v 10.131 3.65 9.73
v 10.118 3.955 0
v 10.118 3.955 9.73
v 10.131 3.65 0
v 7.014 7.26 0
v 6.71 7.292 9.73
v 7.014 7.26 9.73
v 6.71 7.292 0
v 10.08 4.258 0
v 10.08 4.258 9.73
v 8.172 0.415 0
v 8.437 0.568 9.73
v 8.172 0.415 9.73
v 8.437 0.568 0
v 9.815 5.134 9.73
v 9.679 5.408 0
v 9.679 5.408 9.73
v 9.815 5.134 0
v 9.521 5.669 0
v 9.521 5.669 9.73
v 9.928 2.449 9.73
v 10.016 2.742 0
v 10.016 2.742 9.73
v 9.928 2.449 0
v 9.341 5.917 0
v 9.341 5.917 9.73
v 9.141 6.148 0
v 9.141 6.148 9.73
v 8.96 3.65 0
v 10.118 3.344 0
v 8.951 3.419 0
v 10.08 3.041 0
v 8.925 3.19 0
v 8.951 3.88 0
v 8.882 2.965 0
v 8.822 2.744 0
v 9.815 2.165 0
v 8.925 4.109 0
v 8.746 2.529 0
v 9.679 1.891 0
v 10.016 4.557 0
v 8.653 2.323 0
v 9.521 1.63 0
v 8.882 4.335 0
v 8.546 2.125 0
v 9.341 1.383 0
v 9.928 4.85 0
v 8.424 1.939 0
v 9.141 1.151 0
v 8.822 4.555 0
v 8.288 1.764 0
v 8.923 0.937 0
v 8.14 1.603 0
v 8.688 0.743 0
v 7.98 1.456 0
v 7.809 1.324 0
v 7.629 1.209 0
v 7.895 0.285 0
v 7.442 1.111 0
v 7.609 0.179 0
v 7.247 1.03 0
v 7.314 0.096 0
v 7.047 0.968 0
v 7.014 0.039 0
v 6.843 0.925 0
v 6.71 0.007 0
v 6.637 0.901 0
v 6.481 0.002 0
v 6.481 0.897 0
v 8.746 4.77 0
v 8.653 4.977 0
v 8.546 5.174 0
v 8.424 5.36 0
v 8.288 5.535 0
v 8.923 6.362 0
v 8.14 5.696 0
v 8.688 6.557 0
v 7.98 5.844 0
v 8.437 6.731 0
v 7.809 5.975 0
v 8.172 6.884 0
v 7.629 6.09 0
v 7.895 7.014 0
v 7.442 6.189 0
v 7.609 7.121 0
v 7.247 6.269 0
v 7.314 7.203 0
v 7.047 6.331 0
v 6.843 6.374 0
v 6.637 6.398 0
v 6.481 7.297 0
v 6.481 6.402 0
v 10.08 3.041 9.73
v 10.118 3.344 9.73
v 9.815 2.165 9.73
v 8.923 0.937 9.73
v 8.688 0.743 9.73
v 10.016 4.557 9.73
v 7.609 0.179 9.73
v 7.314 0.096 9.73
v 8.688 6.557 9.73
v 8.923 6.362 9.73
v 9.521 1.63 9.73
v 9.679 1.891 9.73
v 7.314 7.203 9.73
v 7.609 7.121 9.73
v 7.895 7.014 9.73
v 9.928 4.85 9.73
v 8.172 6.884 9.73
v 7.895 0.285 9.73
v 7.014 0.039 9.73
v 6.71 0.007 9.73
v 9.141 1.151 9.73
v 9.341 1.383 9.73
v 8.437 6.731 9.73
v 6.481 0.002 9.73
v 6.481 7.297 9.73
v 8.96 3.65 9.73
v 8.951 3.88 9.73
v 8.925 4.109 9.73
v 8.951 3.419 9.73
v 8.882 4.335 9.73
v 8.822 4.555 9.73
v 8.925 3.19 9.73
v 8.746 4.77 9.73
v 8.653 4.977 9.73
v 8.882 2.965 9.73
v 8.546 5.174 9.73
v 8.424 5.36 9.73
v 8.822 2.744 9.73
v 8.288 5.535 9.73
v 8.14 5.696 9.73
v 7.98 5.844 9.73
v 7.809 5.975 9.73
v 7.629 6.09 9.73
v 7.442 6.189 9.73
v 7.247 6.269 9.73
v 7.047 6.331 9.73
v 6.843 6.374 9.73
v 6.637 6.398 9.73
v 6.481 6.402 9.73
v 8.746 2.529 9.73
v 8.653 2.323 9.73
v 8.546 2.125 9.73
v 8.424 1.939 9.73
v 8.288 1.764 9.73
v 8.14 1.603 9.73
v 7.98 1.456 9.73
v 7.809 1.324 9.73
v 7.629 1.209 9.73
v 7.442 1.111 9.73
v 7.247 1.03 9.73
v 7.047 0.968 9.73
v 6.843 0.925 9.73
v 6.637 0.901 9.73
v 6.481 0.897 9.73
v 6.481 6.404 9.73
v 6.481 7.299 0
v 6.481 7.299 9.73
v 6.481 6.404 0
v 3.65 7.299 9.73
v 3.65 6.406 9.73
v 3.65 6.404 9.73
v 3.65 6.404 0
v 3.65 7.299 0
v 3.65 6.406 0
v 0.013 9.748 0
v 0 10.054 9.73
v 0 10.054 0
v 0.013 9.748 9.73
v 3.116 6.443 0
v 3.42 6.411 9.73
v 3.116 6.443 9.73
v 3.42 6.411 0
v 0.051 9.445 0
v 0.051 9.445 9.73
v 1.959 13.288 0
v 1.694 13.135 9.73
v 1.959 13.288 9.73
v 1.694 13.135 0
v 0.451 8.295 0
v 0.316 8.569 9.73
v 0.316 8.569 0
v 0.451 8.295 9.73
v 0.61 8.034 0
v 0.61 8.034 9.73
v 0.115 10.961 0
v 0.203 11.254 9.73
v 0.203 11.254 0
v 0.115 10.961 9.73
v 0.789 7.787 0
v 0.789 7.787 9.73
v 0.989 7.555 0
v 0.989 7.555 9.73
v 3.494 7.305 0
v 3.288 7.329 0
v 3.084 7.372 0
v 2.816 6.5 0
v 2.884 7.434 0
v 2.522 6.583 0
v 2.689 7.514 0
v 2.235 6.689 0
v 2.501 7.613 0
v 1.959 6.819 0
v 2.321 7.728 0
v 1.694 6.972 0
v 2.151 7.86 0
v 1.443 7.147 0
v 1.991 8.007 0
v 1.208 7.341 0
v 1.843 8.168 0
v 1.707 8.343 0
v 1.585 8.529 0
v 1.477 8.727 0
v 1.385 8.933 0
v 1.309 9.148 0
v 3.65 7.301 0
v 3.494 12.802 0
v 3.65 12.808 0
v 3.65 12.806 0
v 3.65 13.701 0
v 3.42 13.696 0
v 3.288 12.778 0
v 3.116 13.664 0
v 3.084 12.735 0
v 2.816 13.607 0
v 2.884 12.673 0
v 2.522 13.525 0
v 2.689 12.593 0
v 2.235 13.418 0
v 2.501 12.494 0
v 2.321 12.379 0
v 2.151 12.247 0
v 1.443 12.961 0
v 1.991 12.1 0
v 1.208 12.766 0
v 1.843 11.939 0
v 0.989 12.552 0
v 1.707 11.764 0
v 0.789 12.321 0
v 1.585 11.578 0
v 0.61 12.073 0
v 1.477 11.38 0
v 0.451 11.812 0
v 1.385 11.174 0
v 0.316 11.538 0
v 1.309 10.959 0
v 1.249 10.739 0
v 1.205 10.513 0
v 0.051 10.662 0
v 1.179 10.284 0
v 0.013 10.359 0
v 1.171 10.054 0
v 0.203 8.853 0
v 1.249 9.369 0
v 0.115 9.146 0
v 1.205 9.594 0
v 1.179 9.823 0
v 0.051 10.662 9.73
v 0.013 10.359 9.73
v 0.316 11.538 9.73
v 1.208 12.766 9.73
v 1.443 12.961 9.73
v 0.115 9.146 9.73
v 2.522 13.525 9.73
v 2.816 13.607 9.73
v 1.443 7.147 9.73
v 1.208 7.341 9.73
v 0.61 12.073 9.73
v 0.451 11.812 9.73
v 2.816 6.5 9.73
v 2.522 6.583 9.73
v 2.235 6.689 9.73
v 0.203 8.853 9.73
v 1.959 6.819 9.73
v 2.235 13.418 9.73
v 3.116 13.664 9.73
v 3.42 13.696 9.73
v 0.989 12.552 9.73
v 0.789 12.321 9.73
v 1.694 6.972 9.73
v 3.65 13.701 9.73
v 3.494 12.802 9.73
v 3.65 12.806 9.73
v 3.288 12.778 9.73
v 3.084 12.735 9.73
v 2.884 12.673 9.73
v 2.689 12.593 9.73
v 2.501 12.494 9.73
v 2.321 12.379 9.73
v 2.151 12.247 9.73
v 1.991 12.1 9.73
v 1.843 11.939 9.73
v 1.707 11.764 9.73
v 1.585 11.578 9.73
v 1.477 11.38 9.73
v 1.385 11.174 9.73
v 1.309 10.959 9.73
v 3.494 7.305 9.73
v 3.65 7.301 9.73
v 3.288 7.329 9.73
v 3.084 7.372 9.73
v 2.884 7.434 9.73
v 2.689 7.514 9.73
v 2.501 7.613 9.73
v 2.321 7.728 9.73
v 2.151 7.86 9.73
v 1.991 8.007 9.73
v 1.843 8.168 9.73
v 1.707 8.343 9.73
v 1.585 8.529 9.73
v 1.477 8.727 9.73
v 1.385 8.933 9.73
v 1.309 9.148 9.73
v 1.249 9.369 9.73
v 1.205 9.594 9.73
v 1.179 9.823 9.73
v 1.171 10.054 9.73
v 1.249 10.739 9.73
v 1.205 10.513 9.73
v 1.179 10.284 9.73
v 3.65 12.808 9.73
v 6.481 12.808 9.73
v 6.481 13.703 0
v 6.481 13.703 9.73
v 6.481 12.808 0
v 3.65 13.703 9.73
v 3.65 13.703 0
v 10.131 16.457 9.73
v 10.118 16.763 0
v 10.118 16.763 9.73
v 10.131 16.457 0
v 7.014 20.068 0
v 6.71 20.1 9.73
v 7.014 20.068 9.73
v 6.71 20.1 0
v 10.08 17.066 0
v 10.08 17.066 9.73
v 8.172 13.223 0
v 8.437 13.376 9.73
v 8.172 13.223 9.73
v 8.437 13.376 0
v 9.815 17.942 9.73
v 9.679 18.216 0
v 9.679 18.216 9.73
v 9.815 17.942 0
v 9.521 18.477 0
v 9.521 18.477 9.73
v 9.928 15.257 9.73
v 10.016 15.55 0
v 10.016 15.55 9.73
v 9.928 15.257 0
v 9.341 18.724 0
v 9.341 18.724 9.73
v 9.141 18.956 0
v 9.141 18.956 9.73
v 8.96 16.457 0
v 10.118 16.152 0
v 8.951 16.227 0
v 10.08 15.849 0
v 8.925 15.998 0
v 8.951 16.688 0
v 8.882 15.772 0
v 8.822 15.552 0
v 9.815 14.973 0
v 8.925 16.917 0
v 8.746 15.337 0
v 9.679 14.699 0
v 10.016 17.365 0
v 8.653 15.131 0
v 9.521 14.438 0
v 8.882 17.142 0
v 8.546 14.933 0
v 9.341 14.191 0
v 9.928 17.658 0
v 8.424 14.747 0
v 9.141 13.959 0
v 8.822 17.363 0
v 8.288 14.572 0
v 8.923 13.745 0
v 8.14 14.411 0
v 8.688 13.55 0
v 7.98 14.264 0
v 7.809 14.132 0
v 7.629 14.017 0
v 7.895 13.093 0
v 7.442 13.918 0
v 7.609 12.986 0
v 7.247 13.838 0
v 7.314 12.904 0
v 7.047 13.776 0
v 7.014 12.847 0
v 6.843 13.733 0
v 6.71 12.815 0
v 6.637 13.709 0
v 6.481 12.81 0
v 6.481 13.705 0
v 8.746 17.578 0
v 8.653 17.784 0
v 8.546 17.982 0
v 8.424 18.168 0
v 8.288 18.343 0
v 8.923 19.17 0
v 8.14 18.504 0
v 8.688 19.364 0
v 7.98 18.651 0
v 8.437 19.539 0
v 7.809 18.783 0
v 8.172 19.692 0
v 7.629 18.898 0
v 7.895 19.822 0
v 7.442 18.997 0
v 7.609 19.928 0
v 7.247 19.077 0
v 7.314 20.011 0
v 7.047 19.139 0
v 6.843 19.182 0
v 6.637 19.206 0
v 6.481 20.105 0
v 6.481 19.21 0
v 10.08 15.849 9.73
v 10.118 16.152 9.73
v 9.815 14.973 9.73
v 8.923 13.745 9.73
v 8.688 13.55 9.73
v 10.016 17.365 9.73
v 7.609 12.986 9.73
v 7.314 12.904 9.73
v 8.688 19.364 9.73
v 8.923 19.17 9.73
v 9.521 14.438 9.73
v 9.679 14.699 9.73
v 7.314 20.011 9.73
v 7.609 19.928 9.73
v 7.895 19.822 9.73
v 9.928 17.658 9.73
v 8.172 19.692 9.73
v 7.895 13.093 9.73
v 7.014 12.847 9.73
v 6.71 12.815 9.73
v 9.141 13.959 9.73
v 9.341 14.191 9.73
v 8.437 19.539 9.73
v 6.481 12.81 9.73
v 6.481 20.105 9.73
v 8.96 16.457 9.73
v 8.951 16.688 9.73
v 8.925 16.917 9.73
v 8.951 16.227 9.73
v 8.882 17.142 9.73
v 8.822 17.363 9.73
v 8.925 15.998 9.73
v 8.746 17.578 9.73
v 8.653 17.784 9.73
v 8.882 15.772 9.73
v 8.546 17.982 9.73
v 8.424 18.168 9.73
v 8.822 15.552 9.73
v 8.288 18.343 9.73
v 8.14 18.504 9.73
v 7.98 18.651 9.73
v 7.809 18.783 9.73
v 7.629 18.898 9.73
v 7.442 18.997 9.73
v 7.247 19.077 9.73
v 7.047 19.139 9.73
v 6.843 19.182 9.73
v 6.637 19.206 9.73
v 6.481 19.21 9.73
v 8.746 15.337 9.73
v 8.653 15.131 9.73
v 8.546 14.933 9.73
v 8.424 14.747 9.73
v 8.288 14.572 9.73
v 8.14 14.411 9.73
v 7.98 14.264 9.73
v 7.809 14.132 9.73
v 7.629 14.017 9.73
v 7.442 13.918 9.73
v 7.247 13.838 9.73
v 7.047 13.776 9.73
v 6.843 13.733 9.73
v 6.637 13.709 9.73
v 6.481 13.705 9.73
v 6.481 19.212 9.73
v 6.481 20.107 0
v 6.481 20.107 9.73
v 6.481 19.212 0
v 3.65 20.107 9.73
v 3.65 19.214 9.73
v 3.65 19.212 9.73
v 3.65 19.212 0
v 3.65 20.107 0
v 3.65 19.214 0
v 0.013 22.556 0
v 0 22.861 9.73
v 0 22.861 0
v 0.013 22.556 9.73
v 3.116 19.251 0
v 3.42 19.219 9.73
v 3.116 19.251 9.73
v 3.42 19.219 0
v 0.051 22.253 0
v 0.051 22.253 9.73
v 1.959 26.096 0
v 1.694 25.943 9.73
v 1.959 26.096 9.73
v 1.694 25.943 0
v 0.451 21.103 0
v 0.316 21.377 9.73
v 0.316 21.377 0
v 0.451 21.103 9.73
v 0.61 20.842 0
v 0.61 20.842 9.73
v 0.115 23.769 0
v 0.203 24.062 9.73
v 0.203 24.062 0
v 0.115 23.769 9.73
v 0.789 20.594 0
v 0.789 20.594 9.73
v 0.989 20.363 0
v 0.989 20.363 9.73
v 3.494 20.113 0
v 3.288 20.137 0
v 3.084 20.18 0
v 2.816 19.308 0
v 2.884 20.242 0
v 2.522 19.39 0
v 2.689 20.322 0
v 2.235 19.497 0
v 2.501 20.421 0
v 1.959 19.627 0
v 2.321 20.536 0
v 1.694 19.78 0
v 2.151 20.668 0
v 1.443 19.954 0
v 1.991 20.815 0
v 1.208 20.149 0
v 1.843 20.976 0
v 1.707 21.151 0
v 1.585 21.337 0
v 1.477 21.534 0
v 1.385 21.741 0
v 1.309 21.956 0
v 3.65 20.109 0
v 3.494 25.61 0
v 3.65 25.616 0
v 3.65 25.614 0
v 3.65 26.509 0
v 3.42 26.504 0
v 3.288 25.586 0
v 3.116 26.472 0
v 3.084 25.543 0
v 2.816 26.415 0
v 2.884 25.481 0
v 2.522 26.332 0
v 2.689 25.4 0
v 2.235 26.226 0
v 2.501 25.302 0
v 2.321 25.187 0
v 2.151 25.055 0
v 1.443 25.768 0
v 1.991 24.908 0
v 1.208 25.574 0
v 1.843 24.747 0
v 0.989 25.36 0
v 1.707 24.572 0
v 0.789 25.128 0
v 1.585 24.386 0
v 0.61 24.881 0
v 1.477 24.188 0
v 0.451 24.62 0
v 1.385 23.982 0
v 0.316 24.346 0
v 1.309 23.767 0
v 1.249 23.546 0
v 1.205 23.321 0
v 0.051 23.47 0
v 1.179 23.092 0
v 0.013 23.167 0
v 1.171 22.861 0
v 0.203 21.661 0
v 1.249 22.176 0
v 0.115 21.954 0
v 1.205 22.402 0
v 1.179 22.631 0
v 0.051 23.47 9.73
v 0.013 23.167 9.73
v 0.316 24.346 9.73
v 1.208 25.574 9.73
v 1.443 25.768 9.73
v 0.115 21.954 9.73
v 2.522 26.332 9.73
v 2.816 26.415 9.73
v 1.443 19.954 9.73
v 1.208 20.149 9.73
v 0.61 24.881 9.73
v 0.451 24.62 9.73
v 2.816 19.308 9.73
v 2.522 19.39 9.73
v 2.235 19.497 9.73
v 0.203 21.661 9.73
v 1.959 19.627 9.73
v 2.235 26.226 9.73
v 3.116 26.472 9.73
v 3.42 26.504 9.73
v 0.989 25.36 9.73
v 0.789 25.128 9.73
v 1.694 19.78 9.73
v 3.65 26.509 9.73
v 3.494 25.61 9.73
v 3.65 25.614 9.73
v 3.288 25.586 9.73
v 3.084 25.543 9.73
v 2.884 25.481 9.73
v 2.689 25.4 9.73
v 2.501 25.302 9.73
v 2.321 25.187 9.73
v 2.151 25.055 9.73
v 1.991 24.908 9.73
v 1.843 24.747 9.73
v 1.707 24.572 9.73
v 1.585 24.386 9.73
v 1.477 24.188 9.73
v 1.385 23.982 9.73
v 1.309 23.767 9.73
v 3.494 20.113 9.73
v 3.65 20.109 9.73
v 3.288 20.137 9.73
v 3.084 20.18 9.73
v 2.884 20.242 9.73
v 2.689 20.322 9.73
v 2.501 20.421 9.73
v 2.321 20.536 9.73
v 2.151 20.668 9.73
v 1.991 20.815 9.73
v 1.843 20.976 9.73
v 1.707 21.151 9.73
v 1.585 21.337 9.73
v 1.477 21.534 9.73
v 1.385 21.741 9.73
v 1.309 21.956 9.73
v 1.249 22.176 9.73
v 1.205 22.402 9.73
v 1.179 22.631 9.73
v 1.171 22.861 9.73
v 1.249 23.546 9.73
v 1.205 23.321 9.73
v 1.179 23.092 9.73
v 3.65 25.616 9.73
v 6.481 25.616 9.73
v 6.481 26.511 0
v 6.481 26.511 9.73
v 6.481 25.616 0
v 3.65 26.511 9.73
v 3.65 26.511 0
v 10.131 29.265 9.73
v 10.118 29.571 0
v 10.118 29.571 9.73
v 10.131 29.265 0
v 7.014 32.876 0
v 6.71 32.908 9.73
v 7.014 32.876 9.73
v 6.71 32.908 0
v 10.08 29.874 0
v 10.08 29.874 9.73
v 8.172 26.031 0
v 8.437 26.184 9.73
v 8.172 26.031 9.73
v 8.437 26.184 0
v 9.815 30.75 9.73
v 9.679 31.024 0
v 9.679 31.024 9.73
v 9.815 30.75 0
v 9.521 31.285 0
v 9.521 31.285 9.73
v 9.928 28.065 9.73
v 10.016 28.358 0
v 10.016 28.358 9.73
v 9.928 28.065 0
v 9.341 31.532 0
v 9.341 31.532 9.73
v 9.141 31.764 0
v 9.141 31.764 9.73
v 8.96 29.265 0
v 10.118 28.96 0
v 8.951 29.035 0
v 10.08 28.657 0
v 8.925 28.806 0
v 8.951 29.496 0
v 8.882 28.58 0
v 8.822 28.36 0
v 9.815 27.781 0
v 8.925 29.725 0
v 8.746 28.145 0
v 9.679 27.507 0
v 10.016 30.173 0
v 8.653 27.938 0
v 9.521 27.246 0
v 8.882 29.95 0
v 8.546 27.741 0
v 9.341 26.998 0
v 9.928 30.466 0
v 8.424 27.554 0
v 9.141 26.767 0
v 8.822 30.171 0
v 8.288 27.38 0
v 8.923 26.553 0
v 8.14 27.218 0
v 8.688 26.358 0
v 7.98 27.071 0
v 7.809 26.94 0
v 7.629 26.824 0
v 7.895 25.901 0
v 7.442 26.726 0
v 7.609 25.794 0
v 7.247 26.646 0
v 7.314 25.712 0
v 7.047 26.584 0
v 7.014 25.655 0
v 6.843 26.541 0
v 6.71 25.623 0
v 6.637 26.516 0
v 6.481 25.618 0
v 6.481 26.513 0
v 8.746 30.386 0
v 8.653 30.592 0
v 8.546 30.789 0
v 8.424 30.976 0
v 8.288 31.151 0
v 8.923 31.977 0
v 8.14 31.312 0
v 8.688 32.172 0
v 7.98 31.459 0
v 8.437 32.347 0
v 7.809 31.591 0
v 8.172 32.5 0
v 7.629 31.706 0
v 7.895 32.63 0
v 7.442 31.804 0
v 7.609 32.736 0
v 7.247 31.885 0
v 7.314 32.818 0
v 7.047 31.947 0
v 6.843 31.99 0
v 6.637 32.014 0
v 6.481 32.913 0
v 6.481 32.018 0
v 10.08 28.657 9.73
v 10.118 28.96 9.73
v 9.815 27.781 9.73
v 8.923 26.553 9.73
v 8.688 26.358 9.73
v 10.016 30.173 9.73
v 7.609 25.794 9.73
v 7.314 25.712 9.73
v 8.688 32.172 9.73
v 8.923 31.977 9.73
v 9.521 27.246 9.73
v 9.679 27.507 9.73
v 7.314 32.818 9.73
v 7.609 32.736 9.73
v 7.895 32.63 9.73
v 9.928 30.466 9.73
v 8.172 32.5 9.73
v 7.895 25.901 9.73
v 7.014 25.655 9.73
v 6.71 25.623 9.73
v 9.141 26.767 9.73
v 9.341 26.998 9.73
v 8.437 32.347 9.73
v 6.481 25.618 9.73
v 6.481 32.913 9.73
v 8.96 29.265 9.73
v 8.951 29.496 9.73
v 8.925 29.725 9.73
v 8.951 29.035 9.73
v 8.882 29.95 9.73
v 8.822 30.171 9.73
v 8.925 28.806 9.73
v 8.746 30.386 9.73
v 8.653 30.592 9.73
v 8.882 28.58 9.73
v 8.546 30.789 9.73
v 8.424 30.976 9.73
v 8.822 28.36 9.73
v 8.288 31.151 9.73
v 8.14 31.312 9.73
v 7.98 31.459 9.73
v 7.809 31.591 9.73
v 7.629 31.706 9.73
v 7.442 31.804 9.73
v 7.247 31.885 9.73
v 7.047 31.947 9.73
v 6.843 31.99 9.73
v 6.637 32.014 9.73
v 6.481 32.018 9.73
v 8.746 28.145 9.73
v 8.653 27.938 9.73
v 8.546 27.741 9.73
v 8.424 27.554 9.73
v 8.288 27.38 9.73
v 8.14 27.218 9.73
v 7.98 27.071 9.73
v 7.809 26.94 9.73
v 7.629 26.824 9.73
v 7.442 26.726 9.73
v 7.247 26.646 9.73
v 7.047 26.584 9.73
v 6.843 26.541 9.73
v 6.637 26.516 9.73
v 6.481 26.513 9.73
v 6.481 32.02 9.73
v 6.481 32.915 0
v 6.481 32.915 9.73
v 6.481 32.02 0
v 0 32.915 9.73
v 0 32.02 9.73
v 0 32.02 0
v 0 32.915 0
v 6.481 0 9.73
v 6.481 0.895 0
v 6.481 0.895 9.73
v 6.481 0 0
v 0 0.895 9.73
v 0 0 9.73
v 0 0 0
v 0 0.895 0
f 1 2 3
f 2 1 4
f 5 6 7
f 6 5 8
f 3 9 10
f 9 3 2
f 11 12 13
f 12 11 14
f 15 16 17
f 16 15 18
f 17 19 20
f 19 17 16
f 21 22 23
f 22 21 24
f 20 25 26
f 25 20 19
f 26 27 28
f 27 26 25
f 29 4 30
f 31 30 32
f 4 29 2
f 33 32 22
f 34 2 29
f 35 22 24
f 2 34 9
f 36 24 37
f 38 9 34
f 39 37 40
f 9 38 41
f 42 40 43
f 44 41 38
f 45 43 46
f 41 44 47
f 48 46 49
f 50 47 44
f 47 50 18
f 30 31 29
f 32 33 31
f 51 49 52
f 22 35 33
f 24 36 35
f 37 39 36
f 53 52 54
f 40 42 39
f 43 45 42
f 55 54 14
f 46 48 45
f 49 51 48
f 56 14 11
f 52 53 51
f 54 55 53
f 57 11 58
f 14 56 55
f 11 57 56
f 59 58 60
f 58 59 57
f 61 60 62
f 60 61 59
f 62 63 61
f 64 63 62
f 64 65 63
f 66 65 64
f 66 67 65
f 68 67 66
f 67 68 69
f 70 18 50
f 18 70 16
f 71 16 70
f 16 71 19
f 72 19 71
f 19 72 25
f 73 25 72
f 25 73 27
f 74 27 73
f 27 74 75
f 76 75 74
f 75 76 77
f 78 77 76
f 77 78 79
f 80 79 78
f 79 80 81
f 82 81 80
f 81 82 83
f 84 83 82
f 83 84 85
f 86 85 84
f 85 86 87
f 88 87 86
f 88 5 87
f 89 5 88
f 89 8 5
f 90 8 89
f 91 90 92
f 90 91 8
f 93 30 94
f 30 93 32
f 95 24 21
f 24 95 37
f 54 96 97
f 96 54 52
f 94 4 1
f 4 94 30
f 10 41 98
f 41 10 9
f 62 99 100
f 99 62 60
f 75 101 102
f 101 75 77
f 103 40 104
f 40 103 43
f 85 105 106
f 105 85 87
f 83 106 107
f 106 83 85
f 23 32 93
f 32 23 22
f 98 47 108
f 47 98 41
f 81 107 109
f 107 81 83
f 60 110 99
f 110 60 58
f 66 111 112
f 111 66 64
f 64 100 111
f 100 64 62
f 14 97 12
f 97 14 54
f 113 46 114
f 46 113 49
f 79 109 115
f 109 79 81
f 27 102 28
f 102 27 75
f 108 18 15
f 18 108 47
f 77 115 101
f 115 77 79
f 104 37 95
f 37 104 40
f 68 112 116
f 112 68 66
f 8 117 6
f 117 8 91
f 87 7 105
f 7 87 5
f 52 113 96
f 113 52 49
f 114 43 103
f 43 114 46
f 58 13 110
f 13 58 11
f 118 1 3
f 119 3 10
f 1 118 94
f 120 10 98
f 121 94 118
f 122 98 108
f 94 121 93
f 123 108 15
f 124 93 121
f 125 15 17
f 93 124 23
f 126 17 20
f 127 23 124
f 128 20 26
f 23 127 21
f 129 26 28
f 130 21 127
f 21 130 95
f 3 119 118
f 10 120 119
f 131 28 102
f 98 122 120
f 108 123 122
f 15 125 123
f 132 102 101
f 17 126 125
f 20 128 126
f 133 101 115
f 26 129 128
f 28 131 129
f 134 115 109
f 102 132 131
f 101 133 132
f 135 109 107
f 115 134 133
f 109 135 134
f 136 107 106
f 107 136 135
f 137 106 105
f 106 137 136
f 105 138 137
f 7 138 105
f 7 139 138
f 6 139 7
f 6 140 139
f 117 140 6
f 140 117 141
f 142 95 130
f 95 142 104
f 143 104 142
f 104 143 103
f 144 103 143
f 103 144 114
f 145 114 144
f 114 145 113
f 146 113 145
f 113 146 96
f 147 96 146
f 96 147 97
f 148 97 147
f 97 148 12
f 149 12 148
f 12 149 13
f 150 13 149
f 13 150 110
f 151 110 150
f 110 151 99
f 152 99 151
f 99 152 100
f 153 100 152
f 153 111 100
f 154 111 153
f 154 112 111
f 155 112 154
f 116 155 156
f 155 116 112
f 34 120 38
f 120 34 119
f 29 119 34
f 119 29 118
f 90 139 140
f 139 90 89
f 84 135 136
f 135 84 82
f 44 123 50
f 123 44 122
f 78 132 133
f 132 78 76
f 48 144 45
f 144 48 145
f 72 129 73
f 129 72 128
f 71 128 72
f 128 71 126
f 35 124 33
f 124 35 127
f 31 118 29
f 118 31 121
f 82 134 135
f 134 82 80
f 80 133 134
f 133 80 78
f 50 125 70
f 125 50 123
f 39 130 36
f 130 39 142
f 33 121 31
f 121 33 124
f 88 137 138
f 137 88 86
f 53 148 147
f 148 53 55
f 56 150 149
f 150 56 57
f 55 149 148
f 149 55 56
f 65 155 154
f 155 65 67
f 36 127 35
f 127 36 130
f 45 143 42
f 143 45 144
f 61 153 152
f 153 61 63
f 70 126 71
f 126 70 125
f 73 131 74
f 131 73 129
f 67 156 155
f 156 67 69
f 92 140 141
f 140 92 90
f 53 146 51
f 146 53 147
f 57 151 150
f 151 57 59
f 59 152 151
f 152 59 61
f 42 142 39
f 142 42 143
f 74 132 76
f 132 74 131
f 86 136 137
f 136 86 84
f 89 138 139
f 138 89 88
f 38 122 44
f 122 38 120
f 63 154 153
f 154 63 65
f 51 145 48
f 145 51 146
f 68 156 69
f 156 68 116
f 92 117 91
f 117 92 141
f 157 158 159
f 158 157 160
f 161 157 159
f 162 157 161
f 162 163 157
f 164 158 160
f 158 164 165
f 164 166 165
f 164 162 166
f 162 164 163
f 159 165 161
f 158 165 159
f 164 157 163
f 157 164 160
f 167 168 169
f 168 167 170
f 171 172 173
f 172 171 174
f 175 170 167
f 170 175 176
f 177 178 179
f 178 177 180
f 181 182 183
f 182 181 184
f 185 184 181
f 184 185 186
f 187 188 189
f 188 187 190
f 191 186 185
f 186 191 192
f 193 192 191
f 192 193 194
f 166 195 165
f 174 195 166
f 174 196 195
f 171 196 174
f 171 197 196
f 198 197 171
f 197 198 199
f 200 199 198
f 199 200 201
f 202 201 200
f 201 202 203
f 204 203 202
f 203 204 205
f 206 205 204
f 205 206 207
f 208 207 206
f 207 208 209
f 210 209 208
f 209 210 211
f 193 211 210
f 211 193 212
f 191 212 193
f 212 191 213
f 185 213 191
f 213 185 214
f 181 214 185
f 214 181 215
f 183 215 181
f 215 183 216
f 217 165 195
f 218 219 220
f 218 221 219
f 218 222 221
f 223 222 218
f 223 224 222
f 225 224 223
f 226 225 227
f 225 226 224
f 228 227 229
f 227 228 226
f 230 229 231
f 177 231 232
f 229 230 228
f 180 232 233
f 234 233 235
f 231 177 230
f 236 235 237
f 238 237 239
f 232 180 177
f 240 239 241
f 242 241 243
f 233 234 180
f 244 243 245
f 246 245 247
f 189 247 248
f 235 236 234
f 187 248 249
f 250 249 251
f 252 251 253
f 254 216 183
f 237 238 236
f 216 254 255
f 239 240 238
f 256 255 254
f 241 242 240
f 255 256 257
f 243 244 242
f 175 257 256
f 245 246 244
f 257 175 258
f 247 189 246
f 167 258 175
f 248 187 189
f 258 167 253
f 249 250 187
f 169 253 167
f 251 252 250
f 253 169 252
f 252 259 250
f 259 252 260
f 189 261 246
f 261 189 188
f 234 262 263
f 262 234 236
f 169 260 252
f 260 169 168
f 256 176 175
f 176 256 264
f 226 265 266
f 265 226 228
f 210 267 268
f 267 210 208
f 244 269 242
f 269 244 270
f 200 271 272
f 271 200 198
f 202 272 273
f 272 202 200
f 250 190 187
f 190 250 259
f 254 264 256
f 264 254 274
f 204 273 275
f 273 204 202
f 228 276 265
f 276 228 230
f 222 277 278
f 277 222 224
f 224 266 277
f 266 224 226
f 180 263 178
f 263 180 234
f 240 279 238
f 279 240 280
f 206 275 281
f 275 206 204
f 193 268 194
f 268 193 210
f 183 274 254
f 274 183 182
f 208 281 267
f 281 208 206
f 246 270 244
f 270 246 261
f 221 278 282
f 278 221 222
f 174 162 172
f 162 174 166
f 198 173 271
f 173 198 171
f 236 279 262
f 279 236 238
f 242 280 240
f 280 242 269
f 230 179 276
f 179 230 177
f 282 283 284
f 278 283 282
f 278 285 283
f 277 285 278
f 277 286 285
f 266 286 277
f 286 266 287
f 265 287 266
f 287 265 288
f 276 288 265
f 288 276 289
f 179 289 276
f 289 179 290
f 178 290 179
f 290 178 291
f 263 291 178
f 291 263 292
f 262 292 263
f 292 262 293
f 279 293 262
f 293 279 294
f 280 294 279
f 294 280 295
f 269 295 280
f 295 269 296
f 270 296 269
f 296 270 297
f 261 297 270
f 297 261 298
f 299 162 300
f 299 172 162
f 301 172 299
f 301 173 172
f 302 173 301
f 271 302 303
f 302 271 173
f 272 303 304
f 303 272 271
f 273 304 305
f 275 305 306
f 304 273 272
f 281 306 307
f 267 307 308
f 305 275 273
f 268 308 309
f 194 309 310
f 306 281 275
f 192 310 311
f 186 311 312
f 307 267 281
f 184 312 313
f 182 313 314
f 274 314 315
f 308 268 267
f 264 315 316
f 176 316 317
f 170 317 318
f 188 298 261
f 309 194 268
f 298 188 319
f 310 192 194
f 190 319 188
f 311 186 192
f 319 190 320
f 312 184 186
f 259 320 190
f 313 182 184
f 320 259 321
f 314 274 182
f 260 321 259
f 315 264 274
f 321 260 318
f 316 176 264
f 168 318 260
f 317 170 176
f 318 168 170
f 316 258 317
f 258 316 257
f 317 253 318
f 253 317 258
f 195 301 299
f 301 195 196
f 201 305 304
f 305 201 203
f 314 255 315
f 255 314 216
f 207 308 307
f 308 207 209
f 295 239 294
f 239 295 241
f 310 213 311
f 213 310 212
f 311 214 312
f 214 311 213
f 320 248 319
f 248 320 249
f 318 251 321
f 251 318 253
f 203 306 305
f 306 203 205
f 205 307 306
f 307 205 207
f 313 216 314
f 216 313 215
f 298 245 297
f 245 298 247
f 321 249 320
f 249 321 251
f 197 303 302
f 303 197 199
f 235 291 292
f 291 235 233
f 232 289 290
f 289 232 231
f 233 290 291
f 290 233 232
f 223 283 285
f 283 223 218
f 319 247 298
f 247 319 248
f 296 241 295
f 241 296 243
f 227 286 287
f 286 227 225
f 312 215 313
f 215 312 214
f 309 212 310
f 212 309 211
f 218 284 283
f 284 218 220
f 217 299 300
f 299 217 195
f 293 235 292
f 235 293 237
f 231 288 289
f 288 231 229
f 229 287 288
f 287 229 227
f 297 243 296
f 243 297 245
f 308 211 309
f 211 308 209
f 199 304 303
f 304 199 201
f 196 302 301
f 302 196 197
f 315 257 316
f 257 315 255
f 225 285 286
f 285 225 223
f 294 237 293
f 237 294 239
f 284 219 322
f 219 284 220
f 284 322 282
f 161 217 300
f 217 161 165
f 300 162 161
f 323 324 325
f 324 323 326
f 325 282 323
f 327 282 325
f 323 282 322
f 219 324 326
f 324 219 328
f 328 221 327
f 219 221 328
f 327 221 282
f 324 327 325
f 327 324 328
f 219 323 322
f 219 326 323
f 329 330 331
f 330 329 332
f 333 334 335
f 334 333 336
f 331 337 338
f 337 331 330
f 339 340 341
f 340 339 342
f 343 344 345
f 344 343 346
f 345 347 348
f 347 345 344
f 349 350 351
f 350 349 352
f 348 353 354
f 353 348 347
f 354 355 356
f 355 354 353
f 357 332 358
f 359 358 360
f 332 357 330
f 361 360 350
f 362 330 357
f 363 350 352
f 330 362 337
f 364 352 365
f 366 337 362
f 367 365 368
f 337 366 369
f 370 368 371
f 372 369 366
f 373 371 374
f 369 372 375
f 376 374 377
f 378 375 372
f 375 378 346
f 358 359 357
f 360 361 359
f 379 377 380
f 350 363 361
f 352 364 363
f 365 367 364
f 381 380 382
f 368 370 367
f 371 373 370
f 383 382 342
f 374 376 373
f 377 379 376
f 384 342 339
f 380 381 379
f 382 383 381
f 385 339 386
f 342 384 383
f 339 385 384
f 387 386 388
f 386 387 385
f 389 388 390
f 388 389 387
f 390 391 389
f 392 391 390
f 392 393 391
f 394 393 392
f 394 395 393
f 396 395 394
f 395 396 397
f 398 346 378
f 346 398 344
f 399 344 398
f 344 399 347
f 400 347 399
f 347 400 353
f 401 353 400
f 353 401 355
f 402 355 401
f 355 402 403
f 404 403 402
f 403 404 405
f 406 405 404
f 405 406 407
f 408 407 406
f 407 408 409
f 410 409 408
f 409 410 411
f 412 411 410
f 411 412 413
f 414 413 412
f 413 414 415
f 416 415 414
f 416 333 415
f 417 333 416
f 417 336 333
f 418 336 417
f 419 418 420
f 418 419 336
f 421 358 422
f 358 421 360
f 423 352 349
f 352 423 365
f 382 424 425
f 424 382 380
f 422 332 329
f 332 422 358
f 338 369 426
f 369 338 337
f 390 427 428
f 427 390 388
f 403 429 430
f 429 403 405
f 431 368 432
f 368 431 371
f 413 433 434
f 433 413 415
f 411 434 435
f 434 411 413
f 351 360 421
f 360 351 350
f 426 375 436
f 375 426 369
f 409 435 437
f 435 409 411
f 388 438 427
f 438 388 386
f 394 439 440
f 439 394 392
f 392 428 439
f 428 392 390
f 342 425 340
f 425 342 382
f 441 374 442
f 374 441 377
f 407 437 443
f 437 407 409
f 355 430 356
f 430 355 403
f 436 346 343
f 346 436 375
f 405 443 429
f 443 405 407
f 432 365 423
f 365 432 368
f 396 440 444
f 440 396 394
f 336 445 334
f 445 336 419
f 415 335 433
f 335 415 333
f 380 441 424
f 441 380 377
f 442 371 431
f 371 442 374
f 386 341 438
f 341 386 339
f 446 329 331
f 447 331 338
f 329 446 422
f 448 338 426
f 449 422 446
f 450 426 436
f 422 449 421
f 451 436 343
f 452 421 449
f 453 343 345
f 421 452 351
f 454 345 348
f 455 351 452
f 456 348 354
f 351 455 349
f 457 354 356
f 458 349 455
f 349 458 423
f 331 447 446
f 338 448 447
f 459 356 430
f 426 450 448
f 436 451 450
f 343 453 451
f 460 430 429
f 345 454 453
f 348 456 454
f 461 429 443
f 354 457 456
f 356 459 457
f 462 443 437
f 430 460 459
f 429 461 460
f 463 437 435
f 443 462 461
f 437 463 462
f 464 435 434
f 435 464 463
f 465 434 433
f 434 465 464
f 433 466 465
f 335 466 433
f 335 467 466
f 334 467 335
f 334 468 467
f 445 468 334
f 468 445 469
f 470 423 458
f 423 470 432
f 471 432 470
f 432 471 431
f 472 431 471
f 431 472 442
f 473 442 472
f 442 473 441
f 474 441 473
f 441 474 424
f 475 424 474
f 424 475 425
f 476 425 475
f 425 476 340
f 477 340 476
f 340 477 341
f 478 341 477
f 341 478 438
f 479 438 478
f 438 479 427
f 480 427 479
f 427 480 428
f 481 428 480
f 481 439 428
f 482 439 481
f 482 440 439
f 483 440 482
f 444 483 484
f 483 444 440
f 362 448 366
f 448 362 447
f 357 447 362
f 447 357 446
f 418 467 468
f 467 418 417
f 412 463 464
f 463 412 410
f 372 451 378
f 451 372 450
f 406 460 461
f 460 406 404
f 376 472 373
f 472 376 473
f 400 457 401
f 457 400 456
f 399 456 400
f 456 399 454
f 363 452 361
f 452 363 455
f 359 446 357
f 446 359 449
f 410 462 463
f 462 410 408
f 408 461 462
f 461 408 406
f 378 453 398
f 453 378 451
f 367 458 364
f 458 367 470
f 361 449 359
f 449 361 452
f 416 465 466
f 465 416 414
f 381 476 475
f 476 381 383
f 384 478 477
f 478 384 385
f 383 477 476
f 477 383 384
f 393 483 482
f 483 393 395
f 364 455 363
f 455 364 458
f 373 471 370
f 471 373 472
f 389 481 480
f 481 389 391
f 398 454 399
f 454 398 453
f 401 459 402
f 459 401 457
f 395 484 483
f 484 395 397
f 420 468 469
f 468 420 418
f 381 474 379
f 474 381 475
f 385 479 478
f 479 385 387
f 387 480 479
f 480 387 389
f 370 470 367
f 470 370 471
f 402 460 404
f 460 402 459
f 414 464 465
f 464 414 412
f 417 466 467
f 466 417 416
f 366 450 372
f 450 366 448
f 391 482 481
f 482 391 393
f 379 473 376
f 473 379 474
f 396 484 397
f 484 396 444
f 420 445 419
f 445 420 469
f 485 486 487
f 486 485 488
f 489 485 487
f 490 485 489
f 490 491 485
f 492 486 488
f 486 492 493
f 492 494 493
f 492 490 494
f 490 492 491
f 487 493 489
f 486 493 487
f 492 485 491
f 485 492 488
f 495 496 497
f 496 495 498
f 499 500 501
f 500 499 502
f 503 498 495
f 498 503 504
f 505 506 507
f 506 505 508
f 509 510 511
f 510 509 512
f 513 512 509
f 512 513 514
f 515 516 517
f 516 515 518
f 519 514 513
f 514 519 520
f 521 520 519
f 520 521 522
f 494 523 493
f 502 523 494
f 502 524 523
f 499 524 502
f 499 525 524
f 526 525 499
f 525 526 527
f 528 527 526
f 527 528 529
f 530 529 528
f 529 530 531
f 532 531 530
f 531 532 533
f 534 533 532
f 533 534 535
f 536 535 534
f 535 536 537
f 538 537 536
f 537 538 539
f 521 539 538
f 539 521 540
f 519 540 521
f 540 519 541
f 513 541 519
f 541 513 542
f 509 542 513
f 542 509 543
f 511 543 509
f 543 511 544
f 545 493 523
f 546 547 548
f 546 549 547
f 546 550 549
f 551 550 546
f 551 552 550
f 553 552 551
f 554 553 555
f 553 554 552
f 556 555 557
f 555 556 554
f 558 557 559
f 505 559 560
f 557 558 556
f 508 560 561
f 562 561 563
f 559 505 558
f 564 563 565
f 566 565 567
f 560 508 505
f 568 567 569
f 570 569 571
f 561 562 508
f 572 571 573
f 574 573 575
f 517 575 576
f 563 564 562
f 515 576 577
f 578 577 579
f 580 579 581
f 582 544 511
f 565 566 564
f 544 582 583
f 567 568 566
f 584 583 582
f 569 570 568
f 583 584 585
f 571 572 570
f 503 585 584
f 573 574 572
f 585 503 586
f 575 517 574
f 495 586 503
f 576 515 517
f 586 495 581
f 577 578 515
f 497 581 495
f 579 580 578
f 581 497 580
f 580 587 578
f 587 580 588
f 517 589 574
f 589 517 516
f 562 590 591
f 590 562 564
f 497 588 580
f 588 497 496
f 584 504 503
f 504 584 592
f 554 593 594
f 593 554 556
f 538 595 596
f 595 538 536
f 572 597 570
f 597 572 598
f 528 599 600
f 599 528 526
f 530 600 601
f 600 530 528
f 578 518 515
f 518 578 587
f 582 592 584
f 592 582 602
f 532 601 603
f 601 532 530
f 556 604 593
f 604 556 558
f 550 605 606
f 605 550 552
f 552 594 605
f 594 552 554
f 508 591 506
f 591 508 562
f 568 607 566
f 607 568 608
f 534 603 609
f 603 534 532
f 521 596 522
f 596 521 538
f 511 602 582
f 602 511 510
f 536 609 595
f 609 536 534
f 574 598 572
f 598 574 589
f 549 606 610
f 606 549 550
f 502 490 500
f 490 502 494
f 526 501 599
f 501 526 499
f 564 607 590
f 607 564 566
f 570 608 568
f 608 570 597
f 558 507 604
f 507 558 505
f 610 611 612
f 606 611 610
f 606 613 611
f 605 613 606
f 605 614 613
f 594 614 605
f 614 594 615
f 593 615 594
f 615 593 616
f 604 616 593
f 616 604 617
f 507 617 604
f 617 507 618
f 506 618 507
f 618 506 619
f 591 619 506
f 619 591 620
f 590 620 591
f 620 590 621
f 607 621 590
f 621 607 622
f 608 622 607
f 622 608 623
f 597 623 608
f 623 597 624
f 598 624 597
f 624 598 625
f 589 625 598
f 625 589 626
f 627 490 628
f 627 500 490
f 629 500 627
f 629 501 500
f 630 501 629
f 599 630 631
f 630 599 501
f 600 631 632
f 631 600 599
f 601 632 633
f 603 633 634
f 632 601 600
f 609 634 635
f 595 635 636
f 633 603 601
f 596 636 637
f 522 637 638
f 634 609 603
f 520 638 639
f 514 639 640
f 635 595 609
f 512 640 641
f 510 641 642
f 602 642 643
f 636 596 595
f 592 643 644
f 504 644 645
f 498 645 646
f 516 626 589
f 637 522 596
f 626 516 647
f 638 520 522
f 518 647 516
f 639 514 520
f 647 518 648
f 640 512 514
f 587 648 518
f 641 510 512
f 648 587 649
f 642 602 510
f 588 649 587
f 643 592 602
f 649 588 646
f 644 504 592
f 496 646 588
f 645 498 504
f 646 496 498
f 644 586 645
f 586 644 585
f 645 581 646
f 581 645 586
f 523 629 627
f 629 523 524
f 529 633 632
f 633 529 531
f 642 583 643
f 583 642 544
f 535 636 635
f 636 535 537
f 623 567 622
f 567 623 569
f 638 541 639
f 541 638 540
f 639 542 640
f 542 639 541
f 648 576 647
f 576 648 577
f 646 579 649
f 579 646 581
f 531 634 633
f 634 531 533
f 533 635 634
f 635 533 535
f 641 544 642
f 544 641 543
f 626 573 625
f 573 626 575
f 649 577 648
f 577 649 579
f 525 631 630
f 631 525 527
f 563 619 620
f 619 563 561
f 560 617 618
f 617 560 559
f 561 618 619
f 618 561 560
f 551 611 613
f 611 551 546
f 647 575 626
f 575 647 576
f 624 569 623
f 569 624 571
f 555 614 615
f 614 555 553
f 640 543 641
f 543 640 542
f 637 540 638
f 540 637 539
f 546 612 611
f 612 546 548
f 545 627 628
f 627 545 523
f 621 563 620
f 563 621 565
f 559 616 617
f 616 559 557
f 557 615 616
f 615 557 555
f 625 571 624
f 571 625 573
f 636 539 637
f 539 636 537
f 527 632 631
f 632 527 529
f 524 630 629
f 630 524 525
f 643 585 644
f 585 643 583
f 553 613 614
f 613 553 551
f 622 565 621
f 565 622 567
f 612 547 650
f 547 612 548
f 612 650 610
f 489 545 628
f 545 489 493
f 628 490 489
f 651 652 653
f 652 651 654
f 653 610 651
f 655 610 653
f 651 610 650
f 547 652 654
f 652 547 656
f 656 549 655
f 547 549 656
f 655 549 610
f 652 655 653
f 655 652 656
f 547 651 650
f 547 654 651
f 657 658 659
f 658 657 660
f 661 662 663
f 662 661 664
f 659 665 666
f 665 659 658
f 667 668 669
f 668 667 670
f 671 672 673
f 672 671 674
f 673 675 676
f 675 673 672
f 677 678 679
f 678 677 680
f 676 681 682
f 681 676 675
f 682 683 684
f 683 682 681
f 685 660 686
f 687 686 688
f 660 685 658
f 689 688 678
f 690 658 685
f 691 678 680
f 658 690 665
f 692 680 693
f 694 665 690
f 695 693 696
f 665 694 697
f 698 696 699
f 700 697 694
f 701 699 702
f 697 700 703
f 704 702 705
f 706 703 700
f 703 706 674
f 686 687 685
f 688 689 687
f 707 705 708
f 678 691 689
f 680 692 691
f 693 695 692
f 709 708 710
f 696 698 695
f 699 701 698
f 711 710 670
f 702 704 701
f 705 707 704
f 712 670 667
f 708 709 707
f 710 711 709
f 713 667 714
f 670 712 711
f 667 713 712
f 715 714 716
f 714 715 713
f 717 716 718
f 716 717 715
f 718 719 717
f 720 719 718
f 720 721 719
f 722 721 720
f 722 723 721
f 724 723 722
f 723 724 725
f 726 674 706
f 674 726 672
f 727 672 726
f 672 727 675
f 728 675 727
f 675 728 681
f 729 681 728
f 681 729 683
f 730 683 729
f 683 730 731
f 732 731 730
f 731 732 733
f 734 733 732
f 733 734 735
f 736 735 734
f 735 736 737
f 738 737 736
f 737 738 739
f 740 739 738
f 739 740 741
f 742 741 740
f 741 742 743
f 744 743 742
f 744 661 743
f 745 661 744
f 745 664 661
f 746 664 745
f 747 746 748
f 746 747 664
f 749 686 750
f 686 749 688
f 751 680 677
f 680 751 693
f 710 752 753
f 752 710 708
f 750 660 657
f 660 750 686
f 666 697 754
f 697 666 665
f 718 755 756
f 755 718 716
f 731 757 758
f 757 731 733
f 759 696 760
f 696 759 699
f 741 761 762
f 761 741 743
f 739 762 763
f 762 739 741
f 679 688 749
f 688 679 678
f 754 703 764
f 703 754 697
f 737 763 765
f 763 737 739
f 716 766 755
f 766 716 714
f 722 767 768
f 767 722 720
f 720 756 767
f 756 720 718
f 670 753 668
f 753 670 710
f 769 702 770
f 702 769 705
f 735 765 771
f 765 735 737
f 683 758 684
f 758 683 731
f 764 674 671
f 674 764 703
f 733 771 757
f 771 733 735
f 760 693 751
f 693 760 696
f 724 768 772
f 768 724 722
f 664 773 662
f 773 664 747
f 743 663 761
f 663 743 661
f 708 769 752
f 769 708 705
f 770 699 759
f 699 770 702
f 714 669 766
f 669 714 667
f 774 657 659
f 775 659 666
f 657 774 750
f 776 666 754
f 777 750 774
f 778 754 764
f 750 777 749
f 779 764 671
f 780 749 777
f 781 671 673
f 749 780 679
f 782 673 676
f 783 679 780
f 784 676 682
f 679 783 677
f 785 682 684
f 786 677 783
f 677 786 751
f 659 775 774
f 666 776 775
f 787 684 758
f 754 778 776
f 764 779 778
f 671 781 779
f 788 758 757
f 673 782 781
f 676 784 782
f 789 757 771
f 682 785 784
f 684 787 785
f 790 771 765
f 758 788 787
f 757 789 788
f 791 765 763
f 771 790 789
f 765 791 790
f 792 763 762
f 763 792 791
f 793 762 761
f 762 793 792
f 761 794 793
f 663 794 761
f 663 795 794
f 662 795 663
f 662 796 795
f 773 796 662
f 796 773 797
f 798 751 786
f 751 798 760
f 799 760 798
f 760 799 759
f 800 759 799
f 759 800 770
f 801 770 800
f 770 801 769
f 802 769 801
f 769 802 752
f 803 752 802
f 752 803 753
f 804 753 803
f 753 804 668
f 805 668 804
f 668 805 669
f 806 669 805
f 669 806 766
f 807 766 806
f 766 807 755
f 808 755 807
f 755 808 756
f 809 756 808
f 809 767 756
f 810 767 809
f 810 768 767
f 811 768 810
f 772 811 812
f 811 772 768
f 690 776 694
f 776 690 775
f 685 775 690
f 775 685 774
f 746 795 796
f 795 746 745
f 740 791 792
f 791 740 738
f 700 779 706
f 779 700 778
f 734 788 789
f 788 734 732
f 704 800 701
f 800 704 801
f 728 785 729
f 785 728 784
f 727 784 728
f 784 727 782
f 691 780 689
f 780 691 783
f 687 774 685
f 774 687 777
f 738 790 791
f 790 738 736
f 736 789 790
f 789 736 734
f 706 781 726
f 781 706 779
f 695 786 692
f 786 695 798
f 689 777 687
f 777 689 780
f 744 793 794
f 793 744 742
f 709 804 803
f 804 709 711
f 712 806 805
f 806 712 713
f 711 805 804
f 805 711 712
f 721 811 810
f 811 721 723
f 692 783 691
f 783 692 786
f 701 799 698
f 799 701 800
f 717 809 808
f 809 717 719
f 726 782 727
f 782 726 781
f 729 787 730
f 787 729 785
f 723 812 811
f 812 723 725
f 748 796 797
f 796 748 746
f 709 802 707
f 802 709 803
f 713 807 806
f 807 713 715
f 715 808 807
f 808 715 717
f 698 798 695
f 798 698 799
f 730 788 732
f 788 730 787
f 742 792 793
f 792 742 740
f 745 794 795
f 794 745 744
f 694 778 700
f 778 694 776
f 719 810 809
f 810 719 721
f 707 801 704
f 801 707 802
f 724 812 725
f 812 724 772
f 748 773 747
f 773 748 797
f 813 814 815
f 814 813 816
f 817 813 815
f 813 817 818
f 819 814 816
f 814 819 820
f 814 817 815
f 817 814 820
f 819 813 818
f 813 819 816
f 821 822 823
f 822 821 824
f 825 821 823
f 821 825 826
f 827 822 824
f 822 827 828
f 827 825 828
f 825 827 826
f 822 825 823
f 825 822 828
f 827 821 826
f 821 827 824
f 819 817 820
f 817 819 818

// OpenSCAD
thkInPlane = 0.89533461;
widthInPlane = 10.13065118;
heightInPlane = 34.25792591;
numberOfSectionsSet = 5.87001062;
thkOutOfPlane = 9.73045426;
numberOfSections = floor(numberOfSectionsSet);
radius = 0.5 * (heightInPlane/numberOfSections + thkInPlane/2);
$fn=75;

spring();

module halfCylinder(rad, thk)
{
	difference() {
		difference() {
			scale([1,1,1]) cylinder(r=radius, h=thk, center=true);
			scale([0.9,1,1]) cylinder(r=radius-thkInPlane, h=thk+2, center=true);
		};
	translate([-rad,0,0]) cube([2*rad,2*rad,thk+2], center=true);
	};
}

module spring() {
cube([widthInPlane-radius, thkInPlane, thkOutOfPlane], center=false);
for (i=[1:numberOfSections]) {
	echo(i);
	if (i%2 != 0) {
		echo("in the first if-loop");
		translate([widthInPlane-radius,2*(i-1)*radius+radius-(i-1)*thkInPlane,thkOutOfPlane/2])
		halfCylinder(radius, thkOutOfPlane);
		translate([radius,2*i*radius-i*thkInPlane,0])
		cube([widthInPlane-2*radius,thkInPlane,thkOutOfPlane], center=false);
	}
	else {
		echo("in the else-loop");
		translate([radius,(2*i-1)*radius-(i-1)*thkInPlane,thkOutOfPlane/2])
		rotate([0,0,180])
		halfCylinder(radius, thkOutOfPlane);
		translate([radius,2*i*radius-i*thkInPlane,0])
		cube([widthInPlane-2*radius,thkInPlane,thkOutOfPlane], center=false);
	}
}
if (numberOfSections%2 != 0) {
translate([0,numberOfSections*(2*radius-thkInPlane),0])
cube([radius, thkInPlane, thkOutOfPlane], center=false);
}
else {
translate([widthInPlane-radius,numberOfSections*(2*radius-thkInPlane),0])
	cube([radius, thkInPlane, thkOutOfPlane], center=false);
}
}
